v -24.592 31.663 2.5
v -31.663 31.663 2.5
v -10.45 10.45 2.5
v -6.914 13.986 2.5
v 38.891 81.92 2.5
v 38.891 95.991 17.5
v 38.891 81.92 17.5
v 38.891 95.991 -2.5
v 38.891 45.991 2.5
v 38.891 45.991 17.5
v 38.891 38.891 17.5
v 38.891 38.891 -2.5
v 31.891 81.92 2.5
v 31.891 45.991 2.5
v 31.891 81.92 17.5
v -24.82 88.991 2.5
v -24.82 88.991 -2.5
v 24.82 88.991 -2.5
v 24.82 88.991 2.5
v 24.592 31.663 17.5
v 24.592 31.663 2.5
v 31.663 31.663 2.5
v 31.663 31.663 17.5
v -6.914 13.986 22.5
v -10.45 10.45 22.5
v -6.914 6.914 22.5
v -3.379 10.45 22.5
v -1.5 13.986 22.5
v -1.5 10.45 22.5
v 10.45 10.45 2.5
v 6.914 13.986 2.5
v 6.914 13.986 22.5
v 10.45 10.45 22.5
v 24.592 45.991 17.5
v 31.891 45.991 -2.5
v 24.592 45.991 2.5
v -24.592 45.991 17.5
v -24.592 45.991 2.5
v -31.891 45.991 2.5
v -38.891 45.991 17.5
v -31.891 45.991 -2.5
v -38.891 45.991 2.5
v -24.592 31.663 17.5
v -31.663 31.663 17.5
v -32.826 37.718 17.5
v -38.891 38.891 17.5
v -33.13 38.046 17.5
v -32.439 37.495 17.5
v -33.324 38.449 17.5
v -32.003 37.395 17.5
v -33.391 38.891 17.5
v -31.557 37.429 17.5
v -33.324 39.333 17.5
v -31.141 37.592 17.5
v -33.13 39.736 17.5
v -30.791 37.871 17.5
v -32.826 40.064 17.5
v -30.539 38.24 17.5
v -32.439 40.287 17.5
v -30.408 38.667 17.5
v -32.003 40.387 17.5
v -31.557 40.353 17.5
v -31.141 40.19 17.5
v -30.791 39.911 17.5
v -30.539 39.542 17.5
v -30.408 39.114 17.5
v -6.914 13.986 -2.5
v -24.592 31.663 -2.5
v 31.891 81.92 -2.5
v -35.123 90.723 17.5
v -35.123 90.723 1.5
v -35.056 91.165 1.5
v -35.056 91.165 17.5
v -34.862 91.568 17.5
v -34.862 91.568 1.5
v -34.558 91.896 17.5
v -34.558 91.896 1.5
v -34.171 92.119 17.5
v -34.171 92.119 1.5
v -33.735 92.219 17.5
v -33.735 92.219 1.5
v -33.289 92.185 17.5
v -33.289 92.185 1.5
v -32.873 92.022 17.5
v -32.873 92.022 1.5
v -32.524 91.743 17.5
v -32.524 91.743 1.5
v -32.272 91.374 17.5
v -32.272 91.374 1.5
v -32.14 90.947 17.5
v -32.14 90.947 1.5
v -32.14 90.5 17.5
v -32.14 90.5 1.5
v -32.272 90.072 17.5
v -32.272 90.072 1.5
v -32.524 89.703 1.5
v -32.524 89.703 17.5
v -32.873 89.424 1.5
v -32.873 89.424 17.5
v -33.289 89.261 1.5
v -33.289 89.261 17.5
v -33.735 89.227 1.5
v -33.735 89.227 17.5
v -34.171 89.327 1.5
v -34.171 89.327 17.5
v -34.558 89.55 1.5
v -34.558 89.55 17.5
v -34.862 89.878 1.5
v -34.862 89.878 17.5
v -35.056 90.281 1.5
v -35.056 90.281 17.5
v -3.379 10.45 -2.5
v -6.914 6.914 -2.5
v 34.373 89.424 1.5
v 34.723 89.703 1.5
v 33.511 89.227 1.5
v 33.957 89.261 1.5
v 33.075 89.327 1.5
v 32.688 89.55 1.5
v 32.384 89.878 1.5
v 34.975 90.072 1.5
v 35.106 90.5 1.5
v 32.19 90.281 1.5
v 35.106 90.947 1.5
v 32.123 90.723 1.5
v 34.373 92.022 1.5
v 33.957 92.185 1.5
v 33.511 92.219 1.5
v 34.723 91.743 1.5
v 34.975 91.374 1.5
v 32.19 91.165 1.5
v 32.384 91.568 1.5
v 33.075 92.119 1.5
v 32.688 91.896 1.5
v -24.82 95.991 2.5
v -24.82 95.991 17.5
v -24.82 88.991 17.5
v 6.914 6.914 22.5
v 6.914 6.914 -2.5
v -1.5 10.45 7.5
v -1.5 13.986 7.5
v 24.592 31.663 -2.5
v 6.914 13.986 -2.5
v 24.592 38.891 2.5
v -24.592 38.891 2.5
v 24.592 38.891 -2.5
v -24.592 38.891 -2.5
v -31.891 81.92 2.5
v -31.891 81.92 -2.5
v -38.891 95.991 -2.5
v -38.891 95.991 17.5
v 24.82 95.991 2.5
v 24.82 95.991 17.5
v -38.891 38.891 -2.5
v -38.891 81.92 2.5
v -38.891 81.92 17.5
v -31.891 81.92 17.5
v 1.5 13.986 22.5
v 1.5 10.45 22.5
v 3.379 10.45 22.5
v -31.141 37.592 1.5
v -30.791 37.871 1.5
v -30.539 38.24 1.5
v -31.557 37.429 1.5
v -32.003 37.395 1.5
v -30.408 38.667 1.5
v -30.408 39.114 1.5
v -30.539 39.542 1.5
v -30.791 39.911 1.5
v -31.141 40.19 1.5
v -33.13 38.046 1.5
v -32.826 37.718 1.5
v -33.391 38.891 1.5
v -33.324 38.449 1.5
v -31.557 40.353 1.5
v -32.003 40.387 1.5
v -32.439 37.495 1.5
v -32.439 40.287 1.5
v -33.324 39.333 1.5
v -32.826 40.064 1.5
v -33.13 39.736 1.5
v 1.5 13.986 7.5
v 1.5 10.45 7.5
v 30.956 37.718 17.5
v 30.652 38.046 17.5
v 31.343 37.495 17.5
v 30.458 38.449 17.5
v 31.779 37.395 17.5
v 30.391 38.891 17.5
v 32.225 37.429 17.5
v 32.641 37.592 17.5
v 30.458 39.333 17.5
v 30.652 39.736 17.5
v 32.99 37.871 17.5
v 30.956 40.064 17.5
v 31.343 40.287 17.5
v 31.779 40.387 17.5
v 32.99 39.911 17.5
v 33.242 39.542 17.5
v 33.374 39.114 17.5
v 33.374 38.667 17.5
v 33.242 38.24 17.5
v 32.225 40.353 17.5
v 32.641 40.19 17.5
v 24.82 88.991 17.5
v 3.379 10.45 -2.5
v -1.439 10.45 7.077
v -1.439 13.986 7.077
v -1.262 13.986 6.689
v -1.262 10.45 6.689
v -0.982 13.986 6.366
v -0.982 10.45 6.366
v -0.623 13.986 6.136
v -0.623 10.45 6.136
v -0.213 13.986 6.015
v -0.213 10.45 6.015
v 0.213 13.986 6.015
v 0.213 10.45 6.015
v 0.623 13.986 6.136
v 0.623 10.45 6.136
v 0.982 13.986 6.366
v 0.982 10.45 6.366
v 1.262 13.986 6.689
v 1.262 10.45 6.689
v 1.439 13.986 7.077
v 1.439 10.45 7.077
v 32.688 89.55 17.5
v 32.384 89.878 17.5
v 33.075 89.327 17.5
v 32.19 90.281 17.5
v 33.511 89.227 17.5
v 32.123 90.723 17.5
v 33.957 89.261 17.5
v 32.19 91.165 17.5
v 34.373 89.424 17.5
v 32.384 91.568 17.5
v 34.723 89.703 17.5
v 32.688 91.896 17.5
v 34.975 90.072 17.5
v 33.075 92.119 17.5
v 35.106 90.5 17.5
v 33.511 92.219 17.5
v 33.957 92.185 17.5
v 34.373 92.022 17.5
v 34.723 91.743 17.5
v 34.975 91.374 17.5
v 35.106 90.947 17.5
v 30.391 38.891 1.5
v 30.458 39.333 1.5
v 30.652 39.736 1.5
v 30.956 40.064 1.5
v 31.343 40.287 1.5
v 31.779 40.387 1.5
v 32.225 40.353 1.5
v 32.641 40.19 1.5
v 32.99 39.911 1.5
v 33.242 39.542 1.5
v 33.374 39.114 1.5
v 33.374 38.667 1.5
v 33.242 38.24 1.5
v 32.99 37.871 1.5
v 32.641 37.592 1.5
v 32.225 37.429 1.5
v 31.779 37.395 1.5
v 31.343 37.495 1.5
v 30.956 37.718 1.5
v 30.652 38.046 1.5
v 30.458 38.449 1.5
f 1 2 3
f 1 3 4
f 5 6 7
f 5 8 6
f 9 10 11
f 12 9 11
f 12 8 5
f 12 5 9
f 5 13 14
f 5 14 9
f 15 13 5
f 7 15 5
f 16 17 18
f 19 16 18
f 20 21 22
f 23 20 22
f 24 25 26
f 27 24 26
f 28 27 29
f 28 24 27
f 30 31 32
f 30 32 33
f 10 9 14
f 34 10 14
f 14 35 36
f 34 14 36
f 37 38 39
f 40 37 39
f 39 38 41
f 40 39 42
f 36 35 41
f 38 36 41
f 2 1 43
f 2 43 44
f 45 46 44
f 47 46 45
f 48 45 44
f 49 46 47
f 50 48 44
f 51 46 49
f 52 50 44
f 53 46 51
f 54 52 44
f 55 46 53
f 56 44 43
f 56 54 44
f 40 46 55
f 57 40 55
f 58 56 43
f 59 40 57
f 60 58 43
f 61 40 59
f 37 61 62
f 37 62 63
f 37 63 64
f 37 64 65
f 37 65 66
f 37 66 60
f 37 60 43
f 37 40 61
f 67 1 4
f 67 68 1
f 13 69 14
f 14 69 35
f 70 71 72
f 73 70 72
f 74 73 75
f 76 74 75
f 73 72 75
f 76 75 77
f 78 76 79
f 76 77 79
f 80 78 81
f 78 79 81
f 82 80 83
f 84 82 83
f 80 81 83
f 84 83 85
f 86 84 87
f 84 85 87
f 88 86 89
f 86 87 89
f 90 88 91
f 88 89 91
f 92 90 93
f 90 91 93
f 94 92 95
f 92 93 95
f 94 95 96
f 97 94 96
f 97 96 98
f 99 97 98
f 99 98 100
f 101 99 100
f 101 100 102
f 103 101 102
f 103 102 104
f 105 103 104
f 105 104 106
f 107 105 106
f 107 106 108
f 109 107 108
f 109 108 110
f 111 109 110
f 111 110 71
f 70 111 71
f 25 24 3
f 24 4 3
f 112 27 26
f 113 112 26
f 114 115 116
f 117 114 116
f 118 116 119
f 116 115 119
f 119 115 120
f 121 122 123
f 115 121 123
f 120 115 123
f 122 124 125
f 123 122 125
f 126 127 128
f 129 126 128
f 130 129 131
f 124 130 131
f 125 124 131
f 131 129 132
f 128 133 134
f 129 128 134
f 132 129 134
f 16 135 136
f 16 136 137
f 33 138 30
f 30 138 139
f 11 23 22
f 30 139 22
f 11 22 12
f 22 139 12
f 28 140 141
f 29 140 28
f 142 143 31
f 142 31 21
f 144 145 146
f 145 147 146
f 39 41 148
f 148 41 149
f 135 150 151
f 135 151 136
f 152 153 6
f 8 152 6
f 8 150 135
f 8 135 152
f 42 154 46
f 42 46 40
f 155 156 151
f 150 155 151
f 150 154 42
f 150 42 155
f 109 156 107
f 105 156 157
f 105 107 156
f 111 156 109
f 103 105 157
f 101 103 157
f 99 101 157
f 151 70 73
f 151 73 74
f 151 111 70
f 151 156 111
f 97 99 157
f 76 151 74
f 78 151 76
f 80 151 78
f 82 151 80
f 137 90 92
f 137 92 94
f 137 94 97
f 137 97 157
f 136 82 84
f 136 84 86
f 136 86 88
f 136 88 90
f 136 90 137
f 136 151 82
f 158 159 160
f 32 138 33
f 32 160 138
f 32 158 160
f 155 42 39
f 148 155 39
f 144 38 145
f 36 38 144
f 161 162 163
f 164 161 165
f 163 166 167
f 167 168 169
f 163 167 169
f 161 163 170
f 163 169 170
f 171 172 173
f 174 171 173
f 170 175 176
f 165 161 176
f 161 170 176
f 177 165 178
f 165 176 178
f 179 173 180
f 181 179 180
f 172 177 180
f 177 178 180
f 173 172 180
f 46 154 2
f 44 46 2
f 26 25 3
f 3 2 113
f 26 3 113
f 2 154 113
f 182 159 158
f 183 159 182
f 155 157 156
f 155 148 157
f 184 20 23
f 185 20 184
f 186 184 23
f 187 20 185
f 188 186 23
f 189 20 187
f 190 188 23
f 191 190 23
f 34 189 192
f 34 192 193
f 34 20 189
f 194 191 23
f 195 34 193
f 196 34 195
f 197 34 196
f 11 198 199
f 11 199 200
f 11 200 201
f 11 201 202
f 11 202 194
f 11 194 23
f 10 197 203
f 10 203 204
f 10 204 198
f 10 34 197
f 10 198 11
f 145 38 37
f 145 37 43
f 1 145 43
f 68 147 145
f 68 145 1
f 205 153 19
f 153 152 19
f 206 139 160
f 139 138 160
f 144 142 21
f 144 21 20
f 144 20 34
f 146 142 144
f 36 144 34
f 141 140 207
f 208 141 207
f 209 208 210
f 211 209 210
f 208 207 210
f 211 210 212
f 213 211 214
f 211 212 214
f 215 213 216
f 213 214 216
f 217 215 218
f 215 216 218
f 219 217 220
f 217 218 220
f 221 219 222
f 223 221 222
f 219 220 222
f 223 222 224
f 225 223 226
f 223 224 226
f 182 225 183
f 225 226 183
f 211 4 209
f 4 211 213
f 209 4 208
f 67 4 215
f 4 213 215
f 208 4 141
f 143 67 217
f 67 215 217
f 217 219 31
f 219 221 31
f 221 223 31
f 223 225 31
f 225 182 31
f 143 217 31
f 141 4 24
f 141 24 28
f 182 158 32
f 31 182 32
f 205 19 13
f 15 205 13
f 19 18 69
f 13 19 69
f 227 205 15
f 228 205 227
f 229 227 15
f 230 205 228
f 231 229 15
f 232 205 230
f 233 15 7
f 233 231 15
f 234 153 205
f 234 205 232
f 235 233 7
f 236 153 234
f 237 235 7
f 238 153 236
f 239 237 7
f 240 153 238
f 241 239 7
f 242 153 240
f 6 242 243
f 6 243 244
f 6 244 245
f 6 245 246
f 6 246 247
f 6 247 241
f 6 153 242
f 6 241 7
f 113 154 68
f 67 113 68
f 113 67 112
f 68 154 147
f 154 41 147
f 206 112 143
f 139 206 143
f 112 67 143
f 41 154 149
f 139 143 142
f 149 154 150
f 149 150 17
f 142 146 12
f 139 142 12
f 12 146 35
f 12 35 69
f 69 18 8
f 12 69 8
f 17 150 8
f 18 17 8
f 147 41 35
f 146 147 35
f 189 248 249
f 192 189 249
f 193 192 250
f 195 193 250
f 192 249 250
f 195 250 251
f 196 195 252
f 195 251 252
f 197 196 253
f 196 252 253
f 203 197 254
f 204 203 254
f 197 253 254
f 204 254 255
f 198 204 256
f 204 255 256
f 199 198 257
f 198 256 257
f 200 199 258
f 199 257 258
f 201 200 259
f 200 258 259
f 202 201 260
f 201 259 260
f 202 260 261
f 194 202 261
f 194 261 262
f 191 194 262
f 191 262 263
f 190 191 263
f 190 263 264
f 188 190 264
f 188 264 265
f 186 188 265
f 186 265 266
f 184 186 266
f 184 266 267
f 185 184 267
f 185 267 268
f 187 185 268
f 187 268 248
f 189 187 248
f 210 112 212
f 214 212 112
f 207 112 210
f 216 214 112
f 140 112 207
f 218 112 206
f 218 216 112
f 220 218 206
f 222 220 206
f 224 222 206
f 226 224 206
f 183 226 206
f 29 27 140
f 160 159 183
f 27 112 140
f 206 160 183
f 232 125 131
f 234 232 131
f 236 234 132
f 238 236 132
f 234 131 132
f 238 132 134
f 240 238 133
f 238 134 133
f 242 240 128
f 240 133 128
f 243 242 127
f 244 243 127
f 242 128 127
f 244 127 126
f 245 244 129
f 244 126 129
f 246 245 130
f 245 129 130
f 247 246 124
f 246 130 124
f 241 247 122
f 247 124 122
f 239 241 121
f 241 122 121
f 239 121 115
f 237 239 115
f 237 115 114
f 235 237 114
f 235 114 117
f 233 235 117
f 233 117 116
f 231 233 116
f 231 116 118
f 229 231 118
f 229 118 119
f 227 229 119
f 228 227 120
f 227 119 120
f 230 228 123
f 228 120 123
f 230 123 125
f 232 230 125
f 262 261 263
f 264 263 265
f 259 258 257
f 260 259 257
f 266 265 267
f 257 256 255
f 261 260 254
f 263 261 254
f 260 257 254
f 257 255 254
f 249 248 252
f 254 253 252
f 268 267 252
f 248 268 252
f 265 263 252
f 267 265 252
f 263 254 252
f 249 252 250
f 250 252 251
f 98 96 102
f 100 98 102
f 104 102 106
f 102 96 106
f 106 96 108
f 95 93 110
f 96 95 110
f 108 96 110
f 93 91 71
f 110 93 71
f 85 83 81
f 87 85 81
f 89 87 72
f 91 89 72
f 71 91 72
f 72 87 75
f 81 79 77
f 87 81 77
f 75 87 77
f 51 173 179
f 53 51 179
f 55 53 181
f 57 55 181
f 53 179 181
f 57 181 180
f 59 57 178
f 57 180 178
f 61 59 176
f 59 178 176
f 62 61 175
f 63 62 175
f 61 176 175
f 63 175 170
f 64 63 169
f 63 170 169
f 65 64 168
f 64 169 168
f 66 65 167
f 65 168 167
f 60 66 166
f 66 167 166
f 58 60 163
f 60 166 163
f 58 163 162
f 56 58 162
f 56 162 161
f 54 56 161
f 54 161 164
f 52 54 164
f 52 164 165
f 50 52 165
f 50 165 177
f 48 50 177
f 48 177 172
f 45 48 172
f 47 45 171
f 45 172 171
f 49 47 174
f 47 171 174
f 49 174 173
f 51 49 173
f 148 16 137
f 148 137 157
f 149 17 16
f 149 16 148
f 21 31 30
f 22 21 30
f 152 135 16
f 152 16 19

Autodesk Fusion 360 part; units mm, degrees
sketch "スケッチ1" plane through (0, 0, 0) normal (0, 0, 1) x (1, 0, 0)
  line L0 (-38.8909, 38.8909) -> (0, 0)
  line L1 (0, 0) -> (38.8909, 38.8909)
  line L2 (38.8909, 38.8909) -> (-38.8909, 38.8909) construction
  line L3 (0, 38.8909) -> (0, 0) construction
  line L4 (-24.5921, 31.6632) -> (-3.3789, 10.45)
  line L5 (-3.3789, 10.45) -> (3.3789, 10.45)
  line L6 (3.3789, 10.45) -> (24.5921, 31.6632)
  line L7 (24.5921, 31.6632) -> (24.5921, 38.8909)
  line L8 (-24.5921, 38.8909) -> (-24.5921, 31.6632)
  line L9 (-24.5921, 38.8909) -> (24.5921, 38.8909)
  line L10 (-38.8909, 38.8909) -> (-38.8909, 45.9909)
  line L11 (-31.8909, 45.9909) -> (31.8909, 45.9909)
  line L12 (38.8909, 45.9909) -> (38.8909, 38.8909)
  line L13 (31.8909, 45.9909) -> (-31.8909, 45.9909)
  line L14 (-38.8909, 45.9909) -> (-38.8909, 95.9909)
  line L15 (-38.8909, 95.9909) -> (38.8909, 95.9909)
  line L16 (38.8909, 95.9909) -> (38.8909, 45.9909)
  line L17 (38.8909, 45.9909) -> (-38.8909, 95.9909) construction
  line L18 (-38.8909, 45.9909) -> (38.8909, 95.9909) construction
  line L19 (-31.8909, 45.9909) -> (-31.8909, 81.9198)
  line L20 (-24.8198, 88.9909) -> (24.8198, 88.9909)
  line L21 (31.8909, 81.9198) -> (31.8909, 45.9909)
  line L22 (-24.8198, 88.9909) -> (-31.8909, 81.9198)
  line L23 (24.8198, 88.9909) -> (31.8909, 81.9198)
  point P0 (0, 70.9909)
  point P1 (0, 70.9909)
  dimension "d1" = 55
  dimension "d3" = 55
  dimension "d4" = 5
  dimension "d5" = 5
  dimension "d6" = 30
  dimension "d7" = 30
  dimension "d8" = 10.45
  dimension "d9" = 7.1
  dimension "d10" = 50
  dimension "d11" = 7
  dimension "d13" = 45
  dimension "d14" = 45
  dimension "d15" = 10
  dimension "d16" = 10
  dimension "d17" = 7
  dimension "d18" = 7
  dimension "d19" = 57.1
  dimension "d20" = 7.1
extrude "押し出し1" add sketch "スケッチ1" along normal mid plane 5
sketch "スケッチ2" plane through (0, 0, 2.5) normal (0, 0, 1) x (1, 0, 0)
  line L0 (-31.8909, 81.9198) -> (-24.8198, 88.9909)
  line L1 (-24.8198, 88.9909) -> (24.8198, 88.9909)
  line L2 (24.8198, 88.9909) -> (31.8909, 81.9198)
  line L3 (31.8909, 81.9198) -> (31.8909, 45.9909)
  line L4 (31.8909, 45.9909) -> (-31.8909, 45.9909)
  line L5 (-31.8909, 45.9909) -> (-31.8909, 81.9198)
  line L6 (-3.3789, 10.45) -> (-24.5921, 31.6632)
  line L7 (-24.5921, 31.6632) -> (-24.5921, 38.8909)
  line L8 (-24.5921, 38.8909) -> (24.5921, 38.8909)
  line L9 (24.5921, 38.8909) -> (24.5921, 31.6632)
  line L10 (24.5921, 31.6632) -> (3.3789, 10.45)
  line L11 (3.3789, 10.45) -> (-3.3789, 10.45)
  line L12 (-38.8909, 38.8909) -> (0, 0)
  line L13 (0, 0) -> (38.8909, 38.8909)
  line L14 (38.8909, 38.8909) -> (38.8909, 95.9909)
  line L15 (38.8909, 95.9909) -> (-38.8909, 95.9909)
  line L16 (-38.8909, 95.9909) -> (-38.8909, 38.8909)
  line L17 (-24.8198, 95.9909) -> (-24.8198, 88.9909)
  line L18 (-24.8198, 88.9909) -> (-31.8909, 81.9198)
  line L19 (-31.8909, 81.9198) -> (-38.8909, 81.9198)
  line L20 (-38.8909, 81.9198) -> (-38.8909, 95.9909)
  line L21 (-38.8909, 95.9909) -> (-24.8198, 95.9909)
  line L22 (24.8198, 95.9909) -> (24.8198, 88.9909)
  line L23 (24.8198, 88.9909) -> (31.8909, 81.9198)
  line L24 (31.8909, 81.9198) -> (38.8909, 81.9198)
  line L25 (38.8909, 81.9198) -> (38.8909, 95.9909)
  line L26 (38.8909, 95.9909) -> (24.8198, 95.9909)
  line L27 (-24.5921, 45.9909) -> (-24.5921, 31.6632)
  line L28 (-24.5921, 31.6632) -> (-31.6632, 31.6632)
  line L29 (-31.6632, 31.6632) -> (-38.8909, 38.8909)
  line L30 (-38.8909, 38.8909) -> (-38.8909, 45.9909)
  line L31 (-38.8909, 45.9909) -> (-24.5921, 45.9909)
  line L32 (24.5921, 45.9909) -> (24.5921, 31.6632)
  line L33 (24.5921, 31.6632) -> (31.6632, 31.6632)
  line L34 (31.6632, 31.6632) -> (38.8909, 38.8909)
  line L35 (38.8909, 38.8909) -> (38.8909, 45.9909)
  line L36 (38.8909, 45.9909) -> (24.5921, 45.9909)
  line L37 (-3.3789, 10.45) -> (-6.9145, 6.9145)
  line L38 (-6.9145, 6.9145) -> (0, 0)
  line L39 (0, 0) -> (6.9145, 6.9145)
  line L40 (6.9145, 6.9145) -> (3.3789, 10.45)
  line L41 (3.3789, 10.45) -> (-3.3789, 10.45)
extrude "押し出し2" add sketch "スケッチ2" along normal blind 15 contours L0 L15 L16 L17 L18 L19 L20 L21 | L4 L7 L12 L16 L27 L28 L29 L30 L31 | L2 L14 L15 L22 L23 L24 L25 L26 | L4 L9 L13 L14 L32 L33 L34 L35 L36
extrude "押し出し3" add sketch "スケッチ2" along normal blind 60 contours L11 L12 L13 L37 L38 L39 L40 L41
sketch "スケッチ3" plane through (0, 0, -2.5) normal (0, 0, -1) x (-1, 0, 0)
  line L0 (24.8198, 88.9909) -> (31.8909, 81.9198)
  line L1 (31.8909, 81.9198) -> (31.8909, 45.9909)
  line L2 (31.8909, 45.9909) -> (-31.8909, 45.9909)
  line L3 (-31.8909, 45.9909) -> (-31.8909, 81.9198)
  line L4 (-31.8909, 81.9198) -> (-24.8198, 88.9909)
  line L5 (-24.8198, 88.9909) -> (24.8198, 88.9909)
  line L6 (24.5921, 31.6632) -> (3.3789, 10.45)
  line L7 (3.3789, 10.45) -> (-3.3789, 10.45)
  line L8 (-3.3789, 10.45) -> (-24.5921, 31.6632)
  line L9 (-24.5921, 31.6632) -> (-24.5921, 38.8909)
  line L10 (-24.5921, 38.8909) -> (24.5921, 38.8909)
  line L11 (24.5921, 38.8909) -> (24.5921, 31.6632)
  line L12 (0, 0) -> (38.8909, 38.8909)
  line L13 (38.8909, 38.8909) -> (38.8909, 95.9909)
  line L14 (38.8909, 95.9909) -> (-38.8909, 95.9909)
  line L15 (-38.8909, 95.9909) -> (-38.8909, 38.8909)
  line L16 (-38.8909, 38.8909) -> (0, 0)
  line L17 (-38.8909, 95.9909) -> (-28.3553, 85.4553) construction
  line L18 (38.8909, 95.9909) -> (28.3553, 85.4553) construction
  circle A0 centre (-33.6231, 90.7231) radius 3.5
  circle A1 centre (33.6231, 90.7231) radius 3.5
  circle A2 centre (-31.8909, 38.8909) radius 3.5
  circle A3 centre (31.8909, 38.8909) radius 3.5
  line L19 (-24.5921, 38.8909) -> (-38.8909, 38.8909) construction
  line L20 (-31.8909, 45.9909) -> (-31.8909, 31.8909) construction
  line L21 (24.5921, 38.8909) -> (38.8909, 38.8909) construction
  line L22 (31.8909, 45.9909) -> (31.8909, 31.8909) construction
  circle A4 centre (-31.8909, 38.8909) radius 1.5
  circle A5 centre (31.8909, 38.8909) radius 1.5
  circle A6 centre (33.6231, 90.7231) radius 1.5
  circle A7 centre (-33.6231, 90.7231) radius 1.5
  dimension "d27" = 7
  dimension "d28" = 7
  dimension "d29" = 7
  dimension "d30" = 7
  dimension "d31" = 3
  dimension "d32" = 3
  dimension "d33" = 3
  dimension "d34" = 3
extrude "押し出し4" cut sketch "スケッチ3" against normal blind 25 contours A4 | A5 | A6 | A7
extrude "押し出し7" cut 1 faces at (0, 6.9667, 62.5) along direction (0, 0, -1) blind 65
sketch "スケッチ8" plane through (0, 0, 2.5) normal (0, 0, 1) x (1, 0, 0)
  line L0 (-6.9145, 6.9145) -> (-3.3789, 10.45)
  line L1 (-3.3789, 10.45) -> (-24.5921, 31.6632)
  line L2 (-24.5921, 31.6632) -> (-31.6632, 31.6632)
  line L3 (-31.6632, 31.6632) -> (-6.9145, 6.9145)
  line L4 (3.3789, 10.45) -> (6.9145, 6.9145)
  line L5 (24.5921, 31.6632) -> (3.3789, 10.45)
  line L6 (6.9145, 6.9145) -> (31.6632, 31.6632)
  line L7 (-3.3789, 10.45) -> (3.3789, 10.45)
  line L8 (-6.9145, 13.9855) -> (6.9145, 13.9855)
  line L9 (6.9145, 13.9855) -> (10.45, 10.45)
  line L10 (-6.9145, 13.9855) -> (-10.45, 10.45)
  dimension "d52" = 5
  dimension "d53" = 5
extrude "押し出し9" add sketch "スケッチ8" against normal blind 5 contours L1 L5 L7 L8
extrude "押し出し10" add sketch "スケッチ8" along normal blind 20 contours L0 L1 L3 L10 | L1 L5 L7 L8 | L4 L5 L6 L9
sketch "スケッチ9" plane through (0, 10.45, 0) normal (0, -1, 0) x (1, 0, 0)
  line L0 (-3.3789, 22.5) -> (-3.3789, -2.5)
  line L1 (-3.3789, -2.5) -> (3.3789, -2.5)
  line L2 (3.3789, -2.5) -> (3.3789, 22.5)
  line L3 (3.3789, 22.5) -> (-3.3789, 22.5)
  arc A0 (-1.5, 7.5) -> (1.5, 7.5) centre (0, 7.5) ccw
  line L4 (0, 7.5) -> (0, -2.5) construction
  line L5 (-1.5, 7.5) -> (-1.5, 22.5)
  line L6 (1.5, 22.5) -> (1.5, 7.5)
  dimension "d58" = 10
  dimension "d59" = 1.5
extrude "押し出し11" cut sketch "スケッチ9" against normal blind 4 contours L3 A0 L5 L6
extrude "押し出し12" add sketch "スケッチ3" against normal blind 4 contours A4 | A5 | A6 | A7
